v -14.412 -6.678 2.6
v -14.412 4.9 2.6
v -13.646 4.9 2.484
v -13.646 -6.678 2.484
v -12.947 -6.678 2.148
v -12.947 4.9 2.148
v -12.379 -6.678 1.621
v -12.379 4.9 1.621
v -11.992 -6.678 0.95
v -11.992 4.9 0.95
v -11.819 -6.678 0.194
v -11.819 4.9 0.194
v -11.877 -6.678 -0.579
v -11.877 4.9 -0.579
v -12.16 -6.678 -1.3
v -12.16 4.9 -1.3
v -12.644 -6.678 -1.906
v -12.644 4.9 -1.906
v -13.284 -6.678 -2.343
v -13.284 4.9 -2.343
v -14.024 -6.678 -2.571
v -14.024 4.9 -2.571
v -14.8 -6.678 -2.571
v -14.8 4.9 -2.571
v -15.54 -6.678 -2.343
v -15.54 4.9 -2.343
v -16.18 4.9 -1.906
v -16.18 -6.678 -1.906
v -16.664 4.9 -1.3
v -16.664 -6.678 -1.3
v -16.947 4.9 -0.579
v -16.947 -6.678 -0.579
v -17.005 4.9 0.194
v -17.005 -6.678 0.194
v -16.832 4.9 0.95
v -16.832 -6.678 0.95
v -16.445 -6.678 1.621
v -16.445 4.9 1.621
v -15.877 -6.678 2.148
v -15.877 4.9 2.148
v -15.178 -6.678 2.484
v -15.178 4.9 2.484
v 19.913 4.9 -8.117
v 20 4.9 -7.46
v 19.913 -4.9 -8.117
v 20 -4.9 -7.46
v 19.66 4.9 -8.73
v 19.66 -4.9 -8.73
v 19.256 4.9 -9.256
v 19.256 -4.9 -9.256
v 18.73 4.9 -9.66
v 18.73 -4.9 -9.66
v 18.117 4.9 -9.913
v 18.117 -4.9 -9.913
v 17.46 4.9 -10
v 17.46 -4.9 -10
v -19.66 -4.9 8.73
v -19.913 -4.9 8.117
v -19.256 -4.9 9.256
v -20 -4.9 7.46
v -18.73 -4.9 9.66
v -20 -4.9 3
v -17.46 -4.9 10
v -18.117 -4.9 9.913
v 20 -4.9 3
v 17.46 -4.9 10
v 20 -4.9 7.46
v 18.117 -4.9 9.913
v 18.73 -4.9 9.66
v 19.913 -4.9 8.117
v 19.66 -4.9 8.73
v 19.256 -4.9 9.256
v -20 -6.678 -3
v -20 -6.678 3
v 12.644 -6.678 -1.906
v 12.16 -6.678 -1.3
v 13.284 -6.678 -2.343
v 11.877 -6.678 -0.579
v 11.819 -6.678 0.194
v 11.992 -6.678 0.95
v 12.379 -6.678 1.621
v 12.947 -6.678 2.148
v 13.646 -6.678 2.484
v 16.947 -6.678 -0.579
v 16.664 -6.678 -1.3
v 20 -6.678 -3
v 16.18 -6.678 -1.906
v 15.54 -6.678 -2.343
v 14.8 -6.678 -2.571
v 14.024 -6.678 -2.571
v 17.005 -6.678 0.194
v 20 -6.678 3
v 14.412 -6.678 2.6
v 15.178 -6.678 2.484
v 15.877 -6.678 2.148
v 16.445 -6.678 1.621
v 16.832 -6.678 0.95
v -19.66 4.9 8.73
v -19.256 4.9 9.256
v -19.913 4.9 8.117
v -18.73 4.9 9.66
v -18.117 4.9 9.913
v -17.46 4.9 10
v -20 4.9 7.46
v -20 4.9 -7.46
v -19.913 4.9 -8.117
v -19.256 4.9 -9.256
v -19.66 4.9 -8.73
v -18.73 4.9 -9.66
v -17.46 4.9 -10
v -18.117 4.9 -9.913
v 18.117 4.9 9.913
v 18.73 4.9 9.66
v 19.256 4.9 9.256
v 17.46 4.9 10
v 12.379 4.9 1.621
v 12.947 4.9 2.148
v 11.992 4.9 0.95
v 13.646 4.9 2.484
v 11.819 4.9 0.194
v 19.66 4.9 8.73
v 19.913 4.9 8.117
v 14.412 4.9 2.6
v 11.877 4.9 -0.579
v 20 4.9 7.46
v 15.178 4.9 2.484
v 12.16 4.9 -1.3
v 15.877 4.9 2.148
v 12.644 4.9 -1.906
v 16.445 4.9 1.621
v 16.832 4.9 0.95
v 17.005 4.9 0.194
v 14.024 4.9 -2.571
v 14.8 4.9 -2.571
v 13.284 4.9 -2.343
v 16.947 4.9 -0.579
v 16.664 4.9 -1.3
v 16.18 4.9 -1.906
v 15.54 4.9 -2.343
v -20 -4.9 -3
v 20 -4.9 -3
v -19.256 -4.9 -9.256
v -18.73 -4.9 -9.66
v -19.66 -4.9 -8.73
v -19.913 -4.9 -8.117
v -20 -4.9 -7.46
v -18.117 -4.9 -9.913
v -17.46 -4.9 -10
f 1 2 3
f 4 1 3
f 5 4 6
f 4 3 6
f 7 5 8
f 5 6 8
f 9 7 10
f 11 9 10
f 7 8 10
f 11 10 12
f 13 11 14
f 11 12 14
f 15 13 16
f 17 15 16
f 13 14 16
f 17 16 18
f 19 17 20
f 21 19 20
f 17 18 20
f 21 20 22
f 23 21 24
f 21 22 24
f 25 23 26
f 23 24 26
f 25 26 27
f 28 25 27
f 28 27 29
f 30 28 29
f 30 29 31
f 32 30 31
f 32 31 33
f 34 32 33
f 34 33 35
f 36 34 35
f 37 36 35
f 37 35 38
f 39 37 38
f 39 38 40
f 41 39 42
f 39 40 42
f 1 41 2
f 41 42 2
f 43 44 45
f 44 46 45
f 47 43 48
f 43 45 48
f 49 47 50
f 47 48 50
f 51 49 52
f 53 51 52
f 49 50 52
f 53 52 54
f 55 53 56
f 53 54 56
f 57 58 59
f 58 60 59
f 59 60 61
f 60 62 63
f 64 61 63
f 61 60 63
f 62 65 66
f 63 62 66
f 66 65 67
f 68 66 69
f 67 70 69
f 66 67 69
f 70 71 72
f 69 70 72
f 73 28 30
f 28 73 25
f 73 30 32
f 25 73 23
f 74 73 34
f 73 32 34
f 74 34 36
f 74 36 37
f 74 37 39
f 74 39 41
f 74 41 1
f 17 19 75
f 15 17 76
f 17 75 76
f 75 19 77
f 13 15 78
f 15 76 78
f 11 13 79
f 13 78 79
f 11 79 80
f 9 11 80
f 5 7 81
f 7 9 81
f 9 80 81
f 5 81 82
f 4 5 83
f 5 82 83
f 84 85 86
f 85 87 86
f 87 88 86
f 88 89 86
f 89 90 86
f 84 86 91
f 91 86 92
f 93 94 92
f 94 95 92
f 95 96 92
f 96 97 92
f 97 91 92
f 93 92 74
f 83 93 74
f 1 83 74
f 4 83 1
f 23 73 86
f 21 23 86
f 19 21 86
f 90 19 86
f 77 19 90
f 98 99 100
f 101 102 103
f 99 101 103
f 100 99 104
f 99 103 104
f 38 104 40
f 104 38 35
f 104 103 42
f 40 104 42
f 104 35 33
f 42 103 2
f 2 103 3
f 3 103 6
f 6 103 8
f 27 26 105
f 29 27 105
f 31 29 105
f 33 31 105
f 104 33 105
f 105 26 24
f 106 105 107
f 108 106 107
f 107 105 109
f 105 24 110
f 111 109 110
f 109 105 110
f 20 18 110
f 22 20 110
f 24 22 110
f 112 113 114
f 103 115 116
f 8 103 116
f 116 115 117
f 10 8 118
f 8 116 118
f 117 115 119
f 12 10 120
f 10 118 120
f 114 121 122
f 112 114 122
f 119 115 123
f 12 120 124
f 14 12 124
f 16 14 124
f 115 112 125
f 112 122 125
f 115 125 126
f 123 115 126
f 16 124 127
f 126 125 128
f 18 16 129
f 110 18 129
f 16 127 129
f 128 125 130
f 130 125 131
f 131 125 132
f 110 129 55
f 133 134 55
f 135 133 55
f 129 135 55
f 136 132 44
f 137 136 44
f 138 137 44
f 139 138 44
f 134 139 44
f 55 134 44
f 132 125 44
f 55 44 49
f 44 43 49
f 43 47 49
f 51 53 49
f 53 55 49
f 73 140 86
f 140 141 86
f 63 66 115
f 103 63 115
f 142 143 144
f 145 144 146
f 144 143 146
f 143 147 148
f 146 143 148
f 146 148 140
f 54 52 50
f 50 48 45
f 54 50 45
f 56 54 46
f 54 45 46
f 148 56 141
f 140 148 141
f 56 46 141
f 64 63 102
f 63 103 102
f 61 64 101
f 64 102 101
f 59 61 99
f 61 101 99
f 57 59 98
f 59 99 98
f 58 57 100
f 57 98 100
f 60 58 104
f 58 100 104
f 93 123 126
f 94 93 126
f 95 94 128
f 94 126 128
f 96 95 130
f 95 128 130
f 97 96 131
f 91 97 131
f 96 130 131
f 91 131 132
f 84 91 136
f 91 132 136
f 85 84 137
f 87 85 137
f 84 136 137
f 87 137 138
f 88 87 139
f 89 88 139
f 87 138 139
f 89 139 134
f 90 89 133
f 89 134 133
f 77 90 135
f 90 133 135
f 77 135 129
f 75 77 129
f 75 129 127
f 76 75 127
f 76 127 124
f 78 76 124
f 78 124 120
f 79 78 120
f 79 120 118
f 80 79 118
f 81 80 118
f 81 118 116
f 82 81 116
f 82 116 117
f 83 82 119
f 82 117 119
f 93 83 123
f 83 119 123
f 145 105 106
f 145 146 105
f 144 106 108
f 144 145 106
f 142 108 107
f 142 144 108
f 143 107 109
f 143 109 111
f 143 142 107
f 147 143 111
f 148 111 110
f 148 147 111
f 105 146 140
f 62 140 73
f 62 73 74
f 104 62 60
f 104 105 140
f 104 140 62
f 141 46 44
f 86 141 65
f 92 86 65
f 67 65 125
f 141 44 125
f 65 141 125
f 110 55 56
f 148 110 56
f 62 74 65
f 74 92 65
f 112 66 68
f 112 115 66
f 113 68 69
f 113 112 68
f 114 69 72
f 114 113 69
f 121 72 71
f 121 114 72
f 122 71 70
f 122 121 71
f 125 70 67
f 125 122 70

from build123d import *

# Parameters (mm, degrees)
BOSS_EXTRUDE1_DEPTH = 20
SKETCH2_R           = 2.6
CUT_EXTRUDE1_DEPTH  = 11.578
FILLET1_R           = 2.54


with BuildPart() as part:
    # Sketch1 → Boss-Extrude1 (new, symmetric)
    with BuildSketch(Plane(origin=(0, 0, 0), x_dir=(0, 0, -1), z_dir=(1, 0, 0))):
        Polygon((-10, 4.9), (10, 4.9), (10, -4.9), (3, -4.9), (3, -6.678), (-3, -6.678), (-3, -4.9), (-10, -4.9), align=None)
    extrude(amount=BOSS_EXTRUDE1_DEPTH, both=True)

    # Sketch2 → Cut-Extrude1 (cut)
    with BuildSketch(Plane(origin=(0, 4.9, 0), x_dir=(1, 0, 0), z_dir=(0, 1, 0))):
        with Locations(Location((-14.412, 0, 0), (0, 0, 270))):
            Circle(SKETCH2_R)
        with Locations(Location((14.412, 0, 0), (0, 0, 270))):
            Circle(SKETCH2_R)
    extrude(amount=-CUT_EXTRUDE1_DEPTH, mode=Mode.SUBTRACT)

    # Fillet1
    fillet1_edges = [part.edges().sort_by_distance(p)[0] for p in [
        (-20, 0, -10),
        (20, 0, 10),
        (20, 0, -10),
        (-20, 0, 10),
    ]]
    fillet(fillet1_edges, radius=FILLET1_R)


solid = part.part
